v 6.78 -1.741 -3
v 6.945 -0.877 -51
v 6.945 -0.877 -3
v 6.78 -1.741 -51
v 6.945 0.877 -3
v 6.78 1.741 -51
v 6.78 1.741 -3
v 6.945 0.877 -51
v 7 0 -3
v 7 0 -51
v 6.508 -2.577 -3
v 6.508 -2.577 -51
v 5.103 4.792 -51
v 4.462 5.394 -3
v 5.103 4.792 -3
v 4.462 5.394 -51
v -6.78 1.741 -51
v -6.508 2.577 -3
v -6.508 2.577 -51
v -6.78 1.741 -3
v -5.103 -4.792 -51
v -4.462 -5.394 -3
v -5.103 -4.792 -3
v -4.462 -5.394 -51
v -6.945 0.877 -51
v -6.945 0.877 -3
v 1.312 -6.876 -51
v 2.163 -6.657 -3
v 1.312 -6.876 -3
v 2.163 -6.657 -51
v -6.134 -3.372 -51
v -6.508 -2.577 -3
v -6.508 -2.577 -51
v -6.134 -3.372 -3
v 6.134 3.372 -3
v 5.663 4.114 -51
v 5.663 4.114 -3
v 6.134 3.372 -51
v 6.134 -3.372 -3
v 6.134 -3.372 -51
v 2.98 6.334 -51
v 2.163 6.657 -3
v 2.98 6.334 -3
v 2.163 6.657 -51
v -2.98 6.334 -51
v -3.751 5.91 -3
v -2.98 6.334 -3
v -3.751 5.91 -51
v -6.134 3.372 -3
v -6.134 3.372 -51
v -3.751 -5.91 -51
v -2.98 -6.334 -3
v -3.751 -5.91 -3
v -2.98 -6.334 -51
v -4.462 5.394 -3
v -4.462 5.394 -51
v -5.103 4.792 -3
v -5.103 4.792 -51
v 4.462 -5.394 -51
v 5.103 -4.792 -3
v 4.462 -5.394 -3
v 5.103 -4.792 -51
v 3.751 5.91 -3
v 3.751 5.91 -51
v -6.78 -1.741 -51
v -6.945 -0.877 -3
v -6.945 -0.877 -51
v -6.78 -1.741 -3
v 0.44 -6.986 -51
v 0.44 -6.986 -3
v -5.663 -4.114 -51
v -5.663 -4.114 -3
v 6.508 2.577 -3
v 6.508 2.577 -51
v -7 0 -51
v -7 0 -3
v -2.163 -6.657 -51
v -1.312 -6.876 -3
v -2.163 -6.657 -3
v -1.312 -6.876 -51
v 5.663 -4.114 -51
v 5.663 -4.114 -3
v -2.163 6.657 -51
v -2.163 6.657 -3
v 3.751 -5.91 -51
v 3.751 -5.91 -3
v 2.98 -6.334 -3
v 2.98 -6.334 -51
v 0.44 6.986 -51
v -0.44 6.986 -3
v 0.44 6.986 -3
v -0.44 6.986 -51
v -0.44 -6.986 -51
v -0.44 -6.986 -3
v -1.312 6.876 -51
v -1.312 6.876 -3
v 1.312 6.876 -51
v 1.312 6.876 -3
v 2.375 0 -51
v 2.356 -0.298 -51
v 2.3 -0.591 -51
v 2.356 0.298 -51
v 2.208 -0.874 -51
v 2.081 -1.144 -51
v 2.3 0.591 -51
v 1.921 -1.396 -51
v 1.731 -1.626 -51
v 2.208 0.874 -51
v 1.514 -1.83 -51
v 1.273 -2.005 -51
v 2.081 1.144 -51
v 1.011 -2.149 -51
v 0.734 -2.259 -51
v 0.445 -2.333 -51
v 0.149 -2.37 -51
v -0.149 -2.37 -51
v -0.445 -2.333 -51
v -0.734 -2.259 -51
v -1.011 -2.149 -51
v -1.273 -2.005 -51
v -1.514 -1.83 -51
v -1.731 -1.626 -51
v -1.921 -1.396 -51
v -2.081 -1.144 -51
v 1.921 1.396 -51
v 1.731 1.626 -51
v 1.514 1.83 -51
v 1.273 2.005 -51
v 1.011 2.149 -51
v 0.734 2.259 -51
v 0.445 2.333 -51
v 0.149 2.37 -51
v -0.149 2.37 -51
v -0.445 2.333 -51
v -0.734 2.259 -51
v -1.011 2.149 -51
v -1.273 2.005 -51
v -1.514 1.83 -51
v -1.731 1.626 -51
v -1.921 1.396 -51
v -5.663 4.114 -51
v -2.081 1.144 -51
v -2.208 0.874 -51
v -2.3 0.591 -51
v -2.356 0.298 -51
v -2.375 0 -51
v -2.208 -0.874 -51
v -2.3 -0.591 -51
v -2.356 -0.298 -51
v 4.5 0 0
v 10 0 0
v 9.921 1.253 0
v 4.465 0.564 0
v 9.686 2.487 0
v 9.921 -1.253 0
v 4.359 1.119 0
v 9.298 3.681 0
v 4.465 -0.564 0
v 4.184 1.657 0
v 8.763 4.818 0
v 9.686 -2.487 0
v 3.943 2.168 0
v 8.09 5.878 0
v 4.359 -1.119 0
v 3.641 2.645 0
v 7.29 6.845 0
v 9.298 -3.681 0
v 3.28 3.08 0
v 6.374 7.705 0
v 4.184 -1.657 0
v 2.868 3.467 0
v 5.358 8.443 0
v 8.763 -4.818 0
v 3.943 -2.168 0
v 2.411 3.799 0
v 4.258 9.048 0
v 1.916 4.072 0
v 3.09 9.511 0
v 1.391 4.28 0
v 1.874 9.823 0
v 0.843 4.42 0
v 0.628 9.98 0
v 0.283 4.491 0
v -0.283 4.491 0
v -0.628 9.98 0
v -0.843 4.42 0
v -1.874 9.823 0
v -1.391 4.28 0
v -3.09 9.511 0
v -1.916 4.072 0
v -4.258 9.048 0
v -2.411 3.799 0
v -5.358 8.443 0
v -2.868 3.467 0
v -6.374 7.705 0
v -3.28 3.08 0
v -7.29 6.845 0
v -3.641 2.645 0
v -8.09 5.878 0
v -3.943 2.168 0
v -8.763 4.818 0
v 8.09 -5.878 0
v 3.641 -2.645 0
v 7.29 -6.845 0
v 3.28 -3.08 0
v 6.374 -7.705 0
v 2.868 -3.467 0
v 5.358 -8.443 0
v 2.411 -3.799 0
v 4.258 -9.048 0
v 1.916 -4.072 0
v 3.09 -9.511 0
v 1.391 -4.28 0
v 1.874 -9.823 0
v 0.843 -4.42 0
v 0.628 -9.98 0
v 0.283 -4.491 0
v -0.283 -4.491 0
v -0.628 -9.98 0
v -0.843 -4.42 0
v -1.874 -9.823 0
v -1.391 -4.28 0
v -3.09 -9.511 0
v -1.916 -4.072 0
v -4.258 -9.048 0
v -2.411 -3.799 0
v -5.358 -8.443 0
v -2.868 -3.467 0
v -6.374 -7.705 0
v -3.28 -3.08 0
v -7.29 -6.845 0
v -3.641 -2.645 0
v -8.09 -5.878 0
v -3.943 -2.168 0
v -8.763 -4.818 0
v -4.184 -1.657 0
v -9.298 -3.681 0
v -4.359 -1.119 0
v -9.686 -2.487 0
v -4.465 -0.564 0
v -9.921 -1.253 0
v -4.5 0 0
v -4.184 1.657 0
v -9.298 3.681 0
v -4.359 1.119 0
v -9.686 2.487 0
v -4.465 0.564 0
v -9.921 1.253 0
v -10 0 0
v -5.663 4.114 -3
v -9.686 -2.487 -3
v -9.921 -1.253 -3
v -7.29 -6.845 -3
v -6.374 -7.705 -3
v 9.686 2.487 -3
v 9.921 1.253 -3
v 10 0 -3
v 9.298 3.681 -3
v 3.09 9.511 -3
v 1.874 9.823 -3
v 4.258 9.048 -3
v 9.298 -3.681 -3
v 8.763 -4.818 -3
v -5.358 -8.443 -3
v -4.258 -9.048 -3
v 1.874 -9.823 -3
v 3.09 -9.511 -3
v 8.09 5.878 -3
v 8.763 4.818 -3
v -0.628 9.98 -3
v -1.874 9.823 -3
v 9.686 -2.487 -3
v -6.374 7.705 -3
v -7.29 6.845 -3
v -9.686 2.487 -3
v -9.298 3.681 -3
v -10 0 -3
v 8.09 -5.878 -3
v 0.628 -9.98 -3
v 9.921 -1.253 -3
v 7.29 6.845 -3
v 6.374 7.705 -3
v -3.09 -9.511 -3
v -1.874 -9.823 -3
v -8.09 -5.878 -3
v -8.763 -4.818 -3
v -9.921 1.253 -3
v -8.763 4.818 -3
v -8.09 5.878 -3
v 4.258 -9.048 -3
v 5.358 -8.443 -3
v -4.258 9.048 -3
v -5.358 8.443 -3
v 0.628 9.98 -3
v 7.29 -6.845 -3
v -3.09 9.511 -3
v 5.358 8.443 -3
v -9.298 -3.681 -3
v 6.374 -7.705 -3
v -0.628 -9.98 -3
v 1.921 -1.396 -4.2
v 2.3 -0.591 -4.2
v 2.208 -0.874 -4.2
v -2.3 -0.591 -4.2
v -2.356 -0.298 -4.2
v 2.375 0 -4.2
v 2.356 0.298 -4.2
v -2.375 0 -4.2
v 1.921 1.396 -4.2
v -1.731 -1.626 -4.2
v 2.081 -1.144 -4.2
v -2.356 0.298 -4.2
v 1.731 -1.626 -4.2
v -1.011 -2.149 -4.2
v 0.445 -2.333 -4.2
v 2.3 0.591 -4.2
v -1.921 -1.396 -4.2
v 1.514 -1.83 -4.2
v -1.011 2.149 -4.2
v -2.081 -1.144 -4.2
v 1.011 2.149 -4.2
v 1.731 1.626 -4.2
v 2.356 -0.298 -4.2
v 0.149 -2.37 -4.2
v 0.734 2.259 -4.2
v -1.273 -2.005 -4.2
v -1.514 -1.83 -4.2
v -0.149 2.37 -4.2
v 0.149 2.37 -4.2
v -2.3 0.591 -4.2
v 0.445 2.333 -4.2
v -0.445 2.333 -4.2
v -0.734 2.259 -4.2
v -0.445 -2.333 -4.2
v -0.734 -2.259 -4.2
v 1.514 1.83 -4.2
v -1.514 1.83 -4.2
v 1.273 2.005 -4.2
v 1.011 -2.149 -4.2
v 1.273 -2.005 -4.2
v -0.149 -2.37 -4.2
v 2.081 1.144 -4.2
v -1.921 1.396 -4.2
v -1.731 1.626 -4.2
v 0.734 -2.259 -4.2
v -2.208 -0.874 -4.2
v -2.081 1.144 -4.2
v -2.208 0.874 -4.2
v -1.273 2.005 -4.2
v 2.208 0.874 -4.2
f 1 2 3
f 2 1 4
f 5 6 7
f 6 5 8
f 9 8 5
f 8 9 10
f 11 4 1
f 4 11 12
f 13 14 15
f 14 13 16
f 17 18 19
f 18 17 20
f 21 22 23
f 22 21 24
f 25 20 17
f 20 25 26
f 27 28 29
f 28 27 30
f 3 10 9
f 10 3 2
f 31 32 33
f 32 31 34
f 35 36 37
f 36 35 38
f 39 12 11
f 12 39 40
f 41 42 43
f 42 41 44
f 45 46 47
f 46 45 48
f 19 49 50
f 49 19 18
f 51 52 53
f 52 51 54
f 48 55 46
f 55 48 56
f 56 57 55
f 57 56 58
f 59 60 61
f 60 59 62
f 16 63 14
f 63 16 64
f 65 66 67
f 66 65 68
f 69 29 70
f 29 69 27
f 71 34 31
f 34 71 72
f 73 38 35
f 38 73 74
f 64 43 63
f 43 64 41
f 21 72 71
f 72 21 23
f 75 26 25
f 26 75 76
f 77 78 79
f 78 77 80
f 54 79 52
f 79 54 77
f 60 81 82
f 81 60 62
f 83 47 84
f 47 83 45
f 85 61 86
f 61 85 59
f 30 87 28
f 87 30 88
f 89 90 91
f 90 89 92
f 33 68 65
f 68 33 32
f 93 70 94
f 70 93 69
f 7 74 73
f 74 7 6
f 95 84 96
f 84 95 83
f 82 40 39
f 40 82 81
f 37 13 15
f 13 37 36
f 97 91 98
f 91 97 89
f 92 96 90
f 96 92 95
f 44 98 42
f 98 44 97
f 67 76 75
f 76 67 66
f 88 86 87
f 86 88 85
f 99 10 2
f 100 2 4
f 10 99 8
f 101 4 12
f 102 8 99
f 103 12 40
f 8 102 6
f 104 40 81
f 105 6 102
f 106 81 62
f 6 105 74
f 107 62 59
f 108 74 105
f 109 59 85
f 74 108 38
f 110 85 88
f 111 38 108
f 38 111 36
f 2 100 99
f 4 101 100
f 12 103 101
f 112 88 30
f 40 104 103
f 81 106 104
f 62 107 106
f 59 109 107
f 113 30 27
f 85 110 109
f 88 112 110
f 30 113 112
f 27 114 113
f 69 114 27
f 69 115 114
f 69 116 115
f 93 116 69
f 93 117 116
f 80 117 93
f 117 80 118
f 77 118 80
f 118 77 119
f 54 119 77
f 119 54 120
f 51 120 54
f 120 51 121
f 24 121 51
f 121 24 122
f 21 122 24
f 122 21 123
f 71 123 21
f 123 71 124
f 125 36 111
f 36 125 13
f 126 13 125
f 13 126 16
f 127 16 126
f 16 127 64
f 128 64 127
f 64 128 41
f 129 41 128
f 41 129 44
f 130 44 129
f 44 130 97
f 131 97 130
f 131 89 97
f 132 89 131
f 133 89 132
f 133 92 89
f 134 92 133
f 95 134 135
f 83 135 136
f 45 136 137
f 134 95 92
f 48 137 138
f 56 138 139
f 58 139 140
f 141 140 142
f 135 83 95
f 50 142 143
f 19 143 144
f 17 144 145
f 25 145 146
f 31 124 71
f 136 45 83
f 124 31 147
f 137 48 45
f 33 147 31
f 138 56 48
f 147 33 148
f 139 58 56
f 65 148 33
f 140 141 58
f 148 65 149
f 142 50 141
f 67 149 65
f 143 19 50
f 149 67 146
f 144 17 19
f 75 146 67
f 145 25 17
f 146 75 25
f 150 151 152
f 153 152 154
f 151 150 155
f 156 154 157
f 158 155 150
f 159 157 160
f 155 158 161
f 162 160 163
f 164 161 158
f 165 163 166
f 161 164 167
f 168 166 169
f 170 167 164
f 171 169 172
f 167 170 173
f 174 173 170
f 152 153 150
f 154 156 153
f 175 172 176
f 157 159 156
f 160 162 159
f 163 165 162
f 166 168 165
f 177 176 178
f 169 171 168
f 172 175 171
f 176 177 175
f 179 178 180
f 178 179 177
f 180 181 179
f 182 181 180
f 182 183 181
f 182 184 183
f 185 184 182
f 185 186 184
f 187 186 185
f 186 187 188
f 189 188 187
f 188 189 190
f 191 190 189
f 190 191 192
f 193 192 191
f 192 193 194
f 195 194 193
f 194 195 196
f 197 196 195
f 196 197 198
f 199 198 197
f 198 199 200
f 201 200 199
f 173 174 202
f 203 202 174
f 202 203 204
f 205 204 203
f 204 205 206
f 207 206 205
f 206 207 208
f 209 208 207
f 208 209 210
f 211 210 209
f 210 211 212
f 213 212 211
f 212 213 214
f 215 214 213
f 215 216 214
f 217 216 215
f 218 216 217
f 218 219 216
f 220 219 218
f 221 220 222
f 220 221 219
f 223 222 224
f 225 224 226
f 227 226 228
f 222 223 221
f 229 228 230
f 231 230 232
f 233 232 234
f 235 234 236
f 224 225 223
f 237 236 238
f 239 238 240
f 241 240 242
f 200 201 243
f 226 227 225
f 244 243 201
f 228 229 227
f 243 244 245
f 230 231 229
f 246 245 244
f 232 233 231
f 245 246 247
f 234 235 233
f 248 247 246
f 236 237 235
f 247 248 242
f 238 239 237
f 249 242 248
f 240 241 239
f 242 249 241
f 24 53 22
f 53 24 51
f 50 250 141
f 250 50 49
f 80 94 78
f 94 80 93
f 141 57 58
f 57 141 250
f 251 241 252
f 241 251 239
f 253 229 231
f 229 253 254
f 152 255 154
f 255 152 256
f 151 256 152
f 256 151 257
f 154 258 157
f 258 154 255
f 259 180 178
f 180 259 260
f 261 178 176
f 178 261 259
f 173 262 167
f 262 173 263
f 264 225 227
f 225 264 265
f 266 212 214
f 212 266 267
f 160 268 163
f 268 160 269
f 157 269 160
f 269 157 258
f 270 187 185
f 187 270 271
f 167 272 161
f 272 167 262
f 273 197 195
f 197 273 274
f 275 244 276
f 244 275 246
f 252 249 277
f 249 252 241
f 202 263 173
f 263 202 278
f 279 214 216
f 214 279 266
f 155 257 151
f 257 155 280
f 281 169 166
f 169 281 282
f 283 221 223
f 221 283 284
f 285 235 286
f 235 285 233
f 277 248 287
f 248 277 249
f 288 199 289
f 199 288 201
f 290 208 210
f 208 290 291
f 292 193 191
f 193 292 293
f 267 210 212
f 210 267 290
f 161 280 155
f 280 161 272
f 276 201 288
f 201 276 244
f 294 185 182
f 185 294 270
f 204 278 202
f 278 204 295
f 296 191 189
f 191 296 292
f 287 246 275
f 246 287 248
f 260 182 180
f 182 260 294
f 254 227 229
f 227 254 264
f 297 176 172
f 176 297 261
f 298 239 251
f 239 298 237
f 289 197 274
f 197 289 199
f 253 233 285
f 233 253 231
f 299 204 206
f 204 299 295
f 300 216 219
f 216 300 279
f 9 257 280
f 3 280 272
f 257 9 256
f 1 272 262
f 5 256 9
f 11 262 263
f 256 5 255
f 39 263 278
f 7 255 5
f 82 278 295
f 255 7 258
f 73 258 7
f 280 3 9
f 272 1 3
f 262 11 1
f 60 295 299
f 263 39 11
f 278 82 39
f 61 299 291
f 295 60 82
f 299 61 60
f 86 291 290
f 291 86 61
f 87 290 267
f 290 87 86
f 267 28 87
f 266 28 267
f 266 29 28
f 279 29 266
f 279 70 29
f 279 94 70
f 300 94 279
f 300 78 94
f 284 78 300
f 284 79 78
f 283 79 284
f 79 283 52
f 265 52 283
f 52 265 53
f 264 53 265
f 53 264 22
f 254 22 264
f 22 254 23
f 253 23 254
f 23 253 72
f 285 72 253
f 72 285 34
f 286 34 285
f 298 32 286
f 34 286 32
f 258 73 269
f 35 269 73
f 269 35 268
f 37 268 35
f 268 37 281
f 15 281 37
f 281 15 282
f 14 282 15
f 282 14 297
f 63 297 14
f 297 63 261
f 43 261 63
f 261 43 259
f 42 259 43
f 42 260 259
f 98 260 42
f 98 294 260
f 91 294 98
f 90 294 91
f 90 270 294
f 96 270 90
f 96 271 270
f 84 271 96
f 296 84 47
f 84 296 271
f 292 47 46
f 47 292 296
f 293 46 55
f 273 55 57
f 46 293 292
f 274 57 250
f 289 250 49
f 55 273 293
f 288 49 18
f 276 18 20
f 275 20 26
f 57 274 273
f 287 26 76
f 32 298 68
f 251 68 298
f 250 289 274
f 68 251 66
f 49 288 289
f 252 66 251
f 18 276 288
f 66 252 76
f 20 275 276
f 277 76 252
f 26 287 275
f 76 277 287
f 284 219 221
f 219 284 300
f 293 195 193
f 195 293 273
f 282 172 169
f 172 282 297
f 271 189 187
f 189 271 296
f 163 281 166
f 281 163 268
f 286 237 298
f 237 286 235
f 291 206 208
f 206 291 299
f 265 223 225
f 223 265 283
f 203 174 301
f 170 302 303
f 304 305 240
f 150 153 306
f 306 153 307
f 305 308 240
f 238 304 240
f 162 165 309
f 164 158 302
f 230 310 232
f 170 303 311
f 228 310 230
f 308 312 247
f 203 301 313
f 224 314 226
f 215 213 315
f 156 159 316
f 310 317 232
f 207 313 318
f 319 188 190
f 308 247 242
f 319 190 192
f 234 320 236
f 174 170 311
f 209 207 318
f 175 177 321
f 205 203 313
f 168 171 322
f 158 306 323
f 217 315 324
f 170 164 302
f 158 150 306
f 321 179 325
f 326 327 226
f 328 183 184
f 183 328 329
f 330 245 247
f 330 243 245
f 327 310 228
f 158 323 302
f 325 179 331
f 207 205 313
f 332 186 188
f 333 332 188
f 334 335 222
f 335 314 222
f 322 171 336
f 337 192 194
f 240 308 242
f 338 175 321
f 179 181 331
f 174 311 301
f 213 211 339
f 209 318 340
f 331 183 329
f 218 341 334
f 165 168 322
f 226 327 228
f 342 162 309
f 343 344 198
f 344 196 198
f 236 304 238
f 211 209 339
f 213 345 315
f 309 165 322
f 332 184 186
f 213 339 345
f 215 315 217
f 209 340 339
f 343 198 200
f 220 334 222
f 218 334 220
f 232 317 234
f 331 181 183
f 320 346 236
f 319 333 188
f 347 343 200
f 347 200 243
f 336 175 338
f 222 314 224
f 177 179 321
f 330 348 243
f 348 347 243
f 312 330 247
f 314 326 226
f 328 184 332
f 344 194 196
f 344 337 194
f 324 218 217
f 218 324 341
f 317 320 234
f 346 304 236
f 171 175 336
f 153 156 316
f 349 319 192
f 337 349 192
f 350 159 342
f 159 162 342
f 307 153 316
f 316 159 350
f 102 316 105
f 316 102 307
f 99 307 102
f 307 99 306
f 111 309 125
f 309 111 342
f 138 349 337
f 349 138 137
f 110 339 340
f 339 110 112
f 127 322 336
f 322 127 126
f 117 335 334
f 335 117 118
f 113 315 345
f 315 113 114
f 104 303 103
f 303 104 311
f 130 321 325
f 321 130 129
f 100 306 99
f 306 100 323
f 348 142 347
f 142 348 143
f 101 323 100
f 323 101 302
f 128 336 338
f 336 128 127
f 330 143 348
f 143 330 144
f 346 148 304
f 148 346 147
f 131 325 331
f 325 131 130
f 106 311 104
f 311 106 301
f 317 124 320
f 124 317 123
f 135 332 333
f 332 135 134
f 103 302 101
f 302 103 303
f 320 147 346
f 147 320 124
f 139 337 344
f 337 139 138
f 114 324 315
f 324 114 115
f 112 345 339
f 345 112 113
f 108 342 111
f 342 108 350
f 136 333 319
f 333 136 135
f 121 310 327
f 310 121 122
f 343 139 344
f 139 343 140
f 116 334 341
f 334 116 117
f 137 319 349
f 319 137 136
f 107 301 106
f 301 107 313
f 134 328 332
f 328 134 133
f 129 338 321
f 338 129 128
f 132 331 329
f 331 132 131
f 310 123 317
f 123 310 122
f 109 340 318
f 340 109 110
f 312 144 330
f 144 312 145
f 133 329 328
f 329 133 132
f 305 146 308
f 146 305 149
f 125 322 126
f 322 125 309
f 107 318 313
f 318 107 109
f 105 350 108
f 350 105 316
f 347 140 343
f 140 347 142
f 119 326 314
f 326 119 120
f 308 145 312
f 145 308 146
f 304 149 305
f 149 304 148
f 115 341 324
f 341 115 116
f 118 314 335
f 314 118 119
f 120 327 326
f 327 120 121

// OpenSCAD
$fn = 50;


difference() {
	union() {
		translate(v = [0, 0, -51.0000000000]) {
			cylinder(h = 51, r = 7.0000000000);
		}
		translate(v = [0, 0, -3.0000000000]) {
			cylinder(h = 3, r = 10.0000000000);
		}
	}
	union() {
		translate(v = [0, 0, 0]) {
			rotate(a = [0, 0, 0]) {
				difference() {
					union() {
						#translate(v = [0, 0, -51.0000000000]) {
							cylinder(h = 51, r = 2.2500000000);
						}
						#translate(v = [0, 0, -4.2000000000]) {
							cylinder(h = 4.2000000000, r1 = 2.3750000000, r2 = 4.5000000000);
						}
						#translate(v = [0, 0, -51.0000000000]) {
							cylinder(h = 51, r = 2.3750000000);
						}
						#translate(v = [0, 0, -51.0000000000]) {
							cylinder(h = 51, r = 2.2500000000);
						}
					}
					union();
				}
			}
		}
	}
}
